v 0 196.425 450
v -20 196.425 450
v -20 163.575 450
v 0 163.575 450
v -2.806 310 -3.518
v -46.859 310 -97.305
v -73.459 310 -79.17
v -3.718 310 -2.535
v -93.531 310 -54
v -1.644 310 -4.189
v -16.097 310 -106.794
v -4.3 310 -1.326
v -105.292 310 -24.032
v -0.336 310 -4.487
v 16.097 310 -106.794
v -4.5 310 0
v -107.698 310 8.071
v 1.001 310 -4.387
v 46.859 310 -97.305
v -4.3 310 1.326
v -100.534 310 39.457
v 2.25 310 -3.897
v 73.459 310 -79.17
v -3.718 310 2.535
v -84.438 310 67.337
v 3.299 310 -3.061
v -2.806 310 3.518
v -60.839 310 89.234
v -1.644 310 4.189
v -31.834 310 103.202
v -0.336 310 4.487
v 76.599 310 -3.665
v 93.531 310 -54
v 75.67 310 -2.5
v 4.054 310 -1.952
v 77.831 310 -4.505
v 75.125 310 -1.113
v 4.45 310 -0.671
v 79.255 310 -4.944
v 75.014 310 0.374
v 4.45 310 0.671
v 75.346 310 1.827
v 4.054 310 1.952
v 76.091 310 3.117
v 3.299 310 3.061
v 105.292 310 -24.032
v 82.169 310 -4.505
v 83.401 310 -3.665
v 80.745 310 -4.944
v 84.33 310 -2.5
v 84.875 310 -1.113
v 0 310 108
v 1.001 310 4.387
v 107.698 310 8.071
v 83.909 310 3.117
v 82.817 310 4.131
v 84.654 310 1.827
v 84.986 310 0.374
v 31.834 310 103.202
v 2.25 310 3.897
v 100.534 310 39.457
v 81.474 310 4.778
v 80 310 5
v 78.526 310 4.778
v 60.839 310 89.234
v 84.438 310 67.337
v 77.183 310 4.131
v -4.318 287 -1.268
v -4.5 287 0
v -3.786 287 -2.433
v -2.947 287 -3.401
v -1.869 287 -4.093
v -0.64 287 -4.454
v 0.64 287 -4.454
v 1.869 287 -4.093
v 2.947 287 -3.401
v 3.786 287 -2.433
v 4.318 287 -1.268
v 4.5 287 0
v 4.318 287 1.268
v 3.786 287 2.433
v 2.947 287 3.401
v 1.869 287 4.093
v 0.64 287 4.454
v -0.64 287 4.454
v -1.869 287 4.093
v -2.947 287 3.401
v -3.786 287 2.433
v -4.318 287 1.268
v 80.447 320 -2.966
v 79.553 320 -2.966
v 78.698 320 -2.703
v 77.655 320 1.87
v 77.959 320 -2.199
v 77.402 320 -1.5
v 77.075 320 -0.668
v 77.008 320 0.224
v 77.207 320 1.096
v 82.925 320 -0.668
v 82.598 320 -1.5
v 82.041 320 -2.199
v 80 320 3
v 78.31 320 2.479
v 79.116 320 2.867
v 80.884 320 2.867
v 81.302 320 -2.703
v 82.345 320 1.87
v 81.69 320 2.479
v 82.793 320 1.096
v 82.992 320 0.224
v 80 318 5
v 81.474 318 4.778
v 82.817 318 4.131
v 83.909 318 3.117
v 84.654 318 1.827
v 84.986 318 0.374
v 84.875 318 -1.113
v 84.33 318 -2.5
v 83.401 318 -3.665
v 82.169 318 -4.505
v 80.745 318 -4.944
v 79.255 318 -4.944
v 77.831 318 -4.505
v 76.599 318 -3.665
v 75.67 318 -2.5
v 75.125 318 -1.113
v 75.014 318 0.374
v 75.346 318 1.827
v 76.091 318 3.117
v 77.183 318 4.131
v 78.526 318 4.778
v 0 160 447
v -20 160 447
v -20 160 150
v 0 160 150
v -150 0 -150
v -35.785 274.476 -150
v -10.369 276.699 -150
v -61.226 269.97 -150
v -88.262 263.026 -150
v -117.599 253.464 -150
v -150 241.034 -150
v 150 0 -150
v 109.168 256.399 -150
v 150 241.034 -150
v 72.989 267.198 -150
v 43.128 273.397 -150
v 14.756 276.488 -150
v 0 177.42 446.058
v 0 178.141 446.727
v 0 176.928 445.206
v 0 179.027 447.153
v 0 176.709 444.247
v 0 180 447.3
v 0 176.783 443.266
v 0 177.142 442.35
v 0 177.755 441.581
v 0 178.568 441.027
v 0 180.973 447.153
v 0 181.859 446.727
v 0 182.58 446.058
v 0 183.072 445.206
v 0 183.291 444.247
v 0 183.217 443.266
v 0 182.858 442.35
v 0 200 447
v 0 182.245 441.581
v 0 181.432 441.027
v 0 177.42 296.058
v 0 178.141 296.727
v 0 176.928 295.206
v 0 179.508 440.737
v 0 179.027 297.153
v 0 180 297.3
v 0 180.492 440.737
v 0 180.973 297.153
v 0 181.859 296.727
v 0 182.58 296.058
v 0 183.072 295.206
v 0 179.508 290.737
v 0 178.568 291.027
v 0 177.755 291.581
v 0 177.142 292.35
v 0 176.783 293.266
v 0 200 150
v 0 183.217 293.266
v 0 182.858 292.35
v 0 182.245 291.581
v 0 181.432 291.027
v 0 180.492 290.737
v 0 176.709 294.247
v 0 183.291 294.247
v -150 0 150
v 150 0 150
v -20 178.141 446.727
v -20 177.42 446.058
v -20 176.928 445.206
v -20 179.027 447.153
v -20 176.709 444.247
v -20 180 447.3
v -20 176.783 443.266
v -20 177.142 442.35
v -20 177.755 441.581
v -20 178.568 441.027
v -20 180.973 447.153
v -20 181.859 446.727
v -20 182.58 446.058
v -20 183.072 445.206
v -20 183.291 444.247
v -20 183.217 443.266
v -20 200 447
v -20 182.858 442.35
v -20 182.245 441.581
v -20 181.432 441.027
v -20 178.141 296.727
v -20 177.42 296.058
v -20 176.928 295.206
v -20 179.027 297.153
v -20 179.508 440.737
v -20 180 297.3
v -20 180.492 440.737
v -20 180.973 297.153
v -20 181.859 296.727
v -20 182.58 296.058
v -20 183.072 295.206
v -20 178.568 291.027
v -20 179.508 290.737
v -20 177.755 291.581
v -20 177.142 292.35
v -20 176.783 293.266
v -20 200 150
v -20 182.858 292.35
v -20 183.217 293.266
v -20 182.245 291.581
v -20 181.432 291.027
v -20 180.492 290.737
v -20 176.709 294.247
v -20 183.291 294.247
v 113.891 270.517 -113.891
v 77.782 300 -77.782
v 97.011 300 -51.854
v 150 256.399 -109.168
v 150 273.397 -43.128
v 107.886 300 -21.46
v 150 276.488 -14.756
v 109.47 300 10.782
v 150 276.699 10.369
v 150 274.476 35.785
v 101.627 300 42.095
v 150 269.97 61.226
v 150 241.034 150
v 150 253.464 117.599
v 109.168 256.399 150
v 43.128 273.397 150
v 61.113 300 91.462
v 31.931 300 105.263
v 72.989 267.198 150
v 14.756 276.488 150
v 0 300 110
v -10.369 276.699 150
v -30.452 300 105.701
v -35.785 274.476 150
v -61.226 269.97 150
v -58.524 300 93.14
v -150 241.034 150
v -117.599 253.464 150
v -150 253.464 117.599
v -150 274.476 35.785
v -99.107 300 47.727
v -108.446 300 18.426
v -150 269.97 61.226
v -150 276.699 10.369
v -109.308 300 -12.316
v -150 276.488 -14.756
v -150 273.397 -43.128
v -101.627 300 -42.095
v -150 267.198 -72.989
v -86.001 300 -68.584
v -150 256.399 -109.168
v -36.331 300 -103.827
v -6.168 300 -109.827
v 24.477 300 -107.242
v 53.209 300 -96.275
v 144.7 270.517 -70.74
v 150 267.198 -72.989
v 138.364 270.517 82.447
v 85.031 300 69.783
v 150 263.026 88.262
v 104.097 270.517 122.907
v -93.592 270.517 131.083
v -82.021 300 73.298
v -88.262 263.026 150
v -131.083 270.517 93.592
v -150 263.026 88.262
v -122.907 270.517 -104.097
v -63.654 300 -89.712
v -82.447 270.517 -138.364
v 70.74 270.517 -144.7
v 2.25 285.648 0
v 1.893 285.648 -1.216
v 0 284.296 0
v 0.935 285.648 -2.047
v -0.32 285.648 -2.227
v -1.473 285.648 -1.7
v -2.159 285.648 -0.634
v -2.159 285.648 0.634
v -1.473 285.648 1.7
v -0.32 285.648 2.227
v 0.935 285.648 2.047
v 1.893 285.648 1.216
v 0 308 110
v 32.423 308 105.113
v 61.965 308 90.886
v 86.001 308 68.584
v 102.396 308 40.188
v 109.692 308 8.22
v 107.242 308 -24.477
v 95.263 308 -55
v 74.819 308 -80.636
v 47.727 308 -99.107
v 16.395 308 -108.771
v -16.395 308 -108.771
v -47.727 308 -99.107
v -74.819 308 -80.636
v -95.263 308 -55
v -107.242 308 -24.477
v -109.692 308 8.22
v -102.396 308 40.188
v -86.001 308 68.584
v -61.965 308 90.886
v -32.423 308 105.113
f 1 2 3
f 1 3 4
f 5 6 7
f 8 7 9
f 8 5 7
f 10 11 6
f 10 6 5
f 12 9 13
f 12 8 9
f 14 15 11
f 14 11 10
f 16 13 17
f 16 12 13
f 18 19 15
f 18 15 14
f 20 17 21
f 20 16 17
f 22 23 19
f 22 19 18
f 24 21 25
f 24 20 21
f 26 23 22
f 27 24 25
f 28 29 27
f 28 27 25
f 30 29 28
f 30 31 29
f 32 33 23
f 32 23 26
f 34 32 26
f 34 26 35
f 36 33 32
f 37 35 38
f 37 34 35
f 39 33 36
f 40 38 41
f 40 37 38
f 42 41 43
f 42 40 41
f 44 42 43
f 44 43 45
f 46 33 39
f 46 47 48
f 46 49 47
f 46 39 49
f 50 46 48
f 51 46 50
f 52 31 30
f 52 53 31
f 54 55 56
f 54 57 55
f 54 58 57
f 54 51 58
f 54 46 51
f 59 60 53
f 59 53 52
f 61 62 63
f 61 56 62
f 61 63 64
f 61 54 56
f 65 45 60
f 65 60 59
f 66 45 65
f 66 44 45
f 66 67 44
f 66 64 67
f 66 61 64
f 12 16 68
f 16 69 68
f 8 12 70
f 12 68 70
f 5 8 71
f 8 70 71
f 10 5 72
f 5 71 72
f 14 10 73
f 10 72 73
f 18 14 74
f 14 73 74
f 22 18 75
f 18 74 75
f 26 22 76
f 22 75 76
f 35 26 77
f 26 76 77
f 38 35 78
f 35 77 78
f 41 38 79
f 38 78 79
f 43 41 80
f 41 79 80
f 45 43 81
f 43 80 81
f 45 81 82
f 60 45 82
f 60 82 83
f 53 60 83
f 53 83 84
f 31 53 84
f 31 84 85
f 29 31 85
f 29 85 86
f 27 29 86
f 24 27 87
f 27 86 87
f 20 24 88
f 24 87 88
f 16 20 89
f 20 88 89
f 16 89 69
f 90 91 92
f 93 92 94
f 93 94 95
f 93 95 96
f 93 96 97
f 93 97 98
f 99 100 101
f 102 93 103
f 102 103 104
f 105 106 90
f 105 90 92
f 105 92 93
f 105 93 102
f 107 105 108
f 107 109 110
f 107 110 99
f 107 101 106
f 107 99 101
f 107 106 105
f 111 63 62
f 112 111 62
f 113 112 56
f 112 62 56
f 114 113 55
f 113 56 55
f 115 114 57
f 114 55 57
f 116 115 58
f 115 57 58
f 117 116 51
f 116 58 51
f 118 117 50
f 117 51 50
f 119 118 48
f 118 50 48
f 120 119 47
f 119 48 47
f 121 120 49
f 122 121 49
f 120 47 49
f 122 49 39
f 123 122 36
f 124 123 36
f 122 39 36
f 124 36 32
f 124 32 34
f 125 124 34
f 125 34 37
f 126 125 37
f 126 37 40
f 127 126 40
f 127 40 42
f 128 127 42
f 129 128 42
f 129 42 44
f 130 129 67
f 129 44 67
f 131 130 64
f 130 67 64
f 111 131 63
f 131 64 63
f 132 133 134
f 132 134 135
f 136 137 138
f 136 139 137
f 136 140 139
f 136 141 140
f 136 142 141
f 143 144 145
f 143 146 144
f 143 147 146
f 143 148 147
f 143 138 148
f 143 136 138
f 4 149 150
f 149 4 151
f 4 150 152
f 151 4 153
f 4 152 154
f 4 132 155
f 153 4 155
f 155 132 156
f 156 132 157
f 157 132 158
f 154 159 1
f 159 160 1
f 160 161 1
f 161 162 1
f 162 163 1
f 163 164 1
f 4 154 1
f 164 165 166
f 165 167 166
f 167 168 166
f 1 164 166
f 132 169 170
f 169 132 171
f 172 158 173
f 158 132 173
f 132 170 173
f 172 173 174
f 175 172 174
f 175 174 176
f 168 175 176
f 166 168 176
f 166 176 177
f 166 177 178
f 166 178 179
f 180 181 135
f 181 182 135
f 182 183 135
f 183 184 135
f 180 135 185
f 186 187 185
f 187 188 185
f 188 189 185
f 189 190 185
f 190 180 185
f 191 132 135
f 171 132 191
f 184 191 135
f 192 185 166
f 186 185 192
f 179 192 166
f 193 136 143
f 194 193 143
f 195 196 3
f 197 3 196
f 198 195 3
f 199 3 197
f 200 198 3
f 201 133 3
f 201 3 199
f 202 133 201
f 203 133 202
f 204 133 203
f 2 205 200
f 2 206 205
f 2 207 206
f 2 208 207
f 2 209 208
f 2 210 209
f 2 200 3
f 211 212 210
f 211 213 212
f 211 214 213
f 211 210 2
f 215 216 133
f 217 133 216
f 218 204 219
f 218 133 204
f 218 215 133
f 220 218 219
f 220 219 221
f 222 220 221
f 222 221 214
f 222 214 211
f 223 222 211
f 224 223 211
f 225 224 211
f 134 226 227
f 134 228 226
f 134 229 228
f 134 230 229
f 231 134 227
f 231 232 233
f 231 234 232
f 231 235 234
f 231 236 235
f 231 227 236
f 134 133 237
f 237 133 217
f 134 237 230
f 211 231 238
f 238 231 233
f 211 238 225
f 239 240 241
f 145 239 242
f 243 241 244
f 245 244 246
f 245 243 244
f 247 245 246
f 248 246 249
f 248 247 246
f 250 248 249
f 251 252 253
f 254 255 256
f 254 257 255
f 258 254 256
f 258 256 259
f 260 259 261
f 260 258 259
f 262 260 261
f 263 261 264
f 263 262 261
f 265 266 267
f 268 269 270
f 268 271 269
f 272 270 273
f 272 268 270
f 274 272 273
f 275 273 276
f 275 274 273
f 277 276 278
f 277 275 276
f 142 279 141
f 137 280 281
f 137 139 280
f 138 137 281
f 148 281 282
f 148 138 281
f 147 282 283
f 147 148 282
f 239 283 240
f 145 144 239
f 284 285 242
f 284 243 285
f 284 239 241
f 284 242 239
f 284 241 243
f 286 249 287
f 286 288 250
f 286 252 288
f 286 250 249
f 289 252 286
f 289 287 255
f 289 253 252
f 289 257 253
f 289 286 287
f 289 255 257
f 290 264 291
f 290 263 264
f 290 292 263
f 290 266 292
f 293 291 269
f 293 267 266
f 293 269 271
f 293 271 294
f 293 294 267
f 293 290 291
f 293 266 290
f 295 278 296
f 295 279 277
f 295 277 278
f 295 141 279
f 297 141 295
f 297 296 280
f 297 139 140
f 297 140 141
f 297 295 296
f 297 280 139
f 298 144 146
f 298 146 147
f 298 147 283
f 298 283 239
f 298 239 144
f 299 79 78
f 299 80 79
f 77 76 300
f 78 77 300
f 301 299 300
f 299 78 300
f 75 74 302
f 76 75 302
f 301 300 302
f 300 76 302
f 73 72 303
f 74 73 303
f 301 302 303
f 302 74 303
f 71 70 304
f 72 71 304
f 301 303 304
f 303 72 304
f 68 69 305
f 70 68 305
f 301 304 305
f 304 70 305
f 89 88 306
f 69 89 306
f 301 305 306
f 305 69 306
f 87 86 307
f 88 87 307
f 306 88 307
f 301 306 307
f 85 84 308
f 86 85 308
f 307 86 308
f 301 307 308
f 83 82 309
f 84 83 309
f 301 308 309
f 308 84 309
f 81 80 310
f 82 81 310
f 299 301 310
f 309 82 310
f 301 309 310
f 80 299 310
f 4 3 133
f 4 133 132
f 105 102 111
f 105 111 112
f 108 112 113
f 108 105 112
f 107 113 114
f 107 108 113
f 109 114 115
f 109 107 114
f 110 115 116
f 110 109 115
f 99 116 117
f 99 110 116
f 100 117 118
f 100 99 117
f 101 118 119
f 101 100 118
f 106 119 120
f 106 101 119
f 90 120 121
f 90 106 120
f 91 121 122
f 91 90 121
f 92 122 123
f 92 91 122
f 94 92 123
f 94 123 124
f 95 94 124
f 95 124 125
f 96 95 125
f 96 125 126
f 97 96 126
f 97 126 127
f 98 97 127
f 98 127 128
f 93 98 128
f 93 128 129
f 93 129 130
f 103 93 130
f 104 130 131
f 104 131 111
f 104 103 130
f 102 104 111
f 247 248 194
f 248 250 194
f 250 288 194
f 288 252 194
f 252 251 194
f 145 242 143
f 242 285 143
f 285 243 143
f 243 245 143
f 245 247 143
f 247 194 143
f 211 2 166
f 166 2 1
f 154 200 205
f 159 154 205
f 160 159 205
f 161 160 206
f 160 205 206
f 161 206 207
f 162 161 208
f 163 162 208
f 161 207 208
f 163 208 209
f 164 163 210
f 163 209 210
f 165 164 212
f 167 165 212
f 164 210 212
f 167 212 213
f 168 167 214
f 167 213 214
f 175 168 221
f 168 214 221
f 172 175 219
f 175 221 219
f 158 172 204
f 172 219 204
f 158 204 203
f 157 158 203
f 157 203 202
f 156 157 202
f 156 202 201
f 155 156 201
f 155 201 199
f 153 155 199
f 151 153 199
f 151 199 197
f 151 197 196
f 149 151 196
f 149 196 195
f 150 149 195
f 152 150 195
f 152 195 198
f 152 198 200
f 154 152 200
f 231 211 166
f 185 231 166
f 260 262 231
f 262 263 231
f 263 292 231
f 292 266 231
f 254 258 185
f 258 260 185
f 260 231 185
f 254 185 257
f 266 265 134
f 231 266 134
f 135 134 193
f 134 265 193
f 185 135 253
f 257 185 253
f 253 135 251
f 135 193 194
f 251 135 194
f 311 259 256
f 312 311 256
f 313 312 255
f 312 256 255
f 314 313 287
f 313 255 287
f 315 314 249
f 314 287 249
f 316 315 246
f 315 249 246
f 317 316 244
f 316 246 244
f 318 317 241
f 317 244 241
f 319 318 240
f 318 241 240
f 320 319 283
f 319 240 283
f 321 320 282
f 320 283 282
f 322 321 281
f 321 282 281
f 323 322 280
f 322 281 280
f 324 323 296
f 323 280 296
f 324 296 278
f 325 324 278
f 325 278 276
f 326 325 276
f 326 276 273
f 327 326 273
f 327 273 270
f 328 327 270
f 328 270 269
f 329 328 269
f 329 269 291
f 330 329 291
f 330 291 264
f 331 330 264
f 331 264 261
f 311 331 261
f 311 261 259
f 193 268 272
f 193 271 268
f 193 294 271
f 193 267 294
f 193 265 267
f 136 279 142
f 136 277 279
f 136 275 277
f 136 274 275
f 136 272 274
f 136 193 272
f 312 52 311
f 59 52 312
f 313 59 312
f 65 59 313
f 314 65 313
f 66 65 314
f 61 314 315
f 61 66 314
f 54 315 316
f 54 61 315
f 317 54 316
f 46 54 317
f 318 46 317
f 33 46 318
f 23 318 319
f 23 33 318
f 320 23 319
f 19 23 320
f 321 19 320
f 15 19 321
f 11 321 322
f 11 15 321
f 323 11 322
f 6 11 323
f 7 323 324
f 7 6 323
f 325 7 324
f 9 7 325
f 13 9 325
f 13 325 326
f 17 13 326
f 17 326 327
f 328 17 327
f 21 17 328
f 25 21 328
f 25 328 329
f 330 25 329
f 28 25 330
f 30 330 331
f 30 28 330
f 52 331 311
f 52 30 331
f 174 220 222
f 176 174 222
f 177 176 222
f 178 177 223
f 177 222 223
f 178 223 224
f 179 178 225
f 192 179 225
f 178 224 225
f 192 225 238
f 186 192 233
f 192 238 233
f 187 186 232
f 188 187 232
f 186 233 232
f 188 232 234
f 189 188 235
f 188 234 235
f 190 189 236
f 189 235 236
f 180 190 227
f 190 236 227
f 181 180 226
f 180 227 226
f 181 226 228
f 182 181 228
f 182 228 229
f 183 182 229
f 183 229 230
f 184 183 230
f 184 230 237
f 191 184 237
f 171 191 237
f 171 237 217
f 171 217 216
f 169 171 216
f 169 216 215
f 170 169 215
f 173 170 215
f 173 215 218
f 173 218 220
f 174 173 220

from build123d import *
from OCP.BRepFilletAPI import BRepFilletAPI_MakeChamfer

# Parameters (mm, degrees)
SKETCH1_W                  = 300
SKETCH1_H                  = 300
BOSS_EXTRUDE1_DEPTH        = 300
SKETCH3_R                  = 110
BOSS_EXTRUDE2_DEPTH        = 10
SKETCH4_R                  = 5
BOSS_EXTRUDE3_DEPTH        = 10
CHAMFER1_SIZE              = 2
CHAMFER2_SIZE              = 2
M10X1_0_TAPPED_HOLE1_D     = 9
M10X1_0_TAPPED_HOLE1_DEPTH = 23
M10X1_0_TAPPED_HOLE1_TIP   = 2.703872786
SKETCH7_W                  = 20
SKETCH7_H                  = 40
BOSS_EXTRUDE4_DEPTH        = 300
CHAMFER3_SIZE              = 3
CHAMFER3_SIZE2             = 3.575260778
M6_CLEARANCE_HOLE1_D       = 6.6


with BuildPart() as part:
    # Sketch1 → Boss-Extrude1 (new body)
    with BuildSketch(Plane(origin=(0, 0, 0), x_dir=(1, 0, 0), z_dir=(0, 1, 0))):
        Rectangle(SKETCH1_W, SKETCH1_H)
    extrude(amount=BOSS_EXTRUDE1_DEPTH)

    # Sketch2 → Cut-Revolve1 (revolve, cut)
    with BuildSketch(Plane.XY, mode=Mode.PRIVATE) as cut_revolve1_sk:
        Polygon((110, 300), (250, 219.170962313), (250, 300), align=None)
    revolve(cut_revolve1_sk.sketch.rotate(Axis((0, 394.192122867, 0), (0, -1, 0)), 314.999999708), axis=Axis((0, 394.192122867, 0), (0, -1, 0)), mode=Mode.SUBTRACT)

    # Sketch3 → Boss-Extrude2 (add)
    with BuildSketch(Plane(origin=(0, 300, 0), x_dir=(1, 0, 0), z_dir=(0, 1, 0))):
        with Locations(Location((0, 0, 0), (0, 0, 270))):
            Circle(SKETCH3_R)
    extrude(amount=BOSS_EXTRUDE2_DEPTH)

    # Sketch4 → Boss-Extrude3 (add)
    with BuildSketch(Plane(origin=(0, 310, 0), x_dir=(1, 0, 0), z_dir=(0, 1, 0))):
        with Locations(Location((80, 0, 0), (0, 0, 270))):
            Circle(SKETCH4_R)
    extrude(amount=BOSS_EXTRUDE3_DEPTH)

    # Chamfer1
    chamfer1_edges = [part.edges().sort_by_distance(p)[0] for p in [
        (0, 310, -110),
    ]]
    chamfer(chamfer1_edges, length=CHAMFER1_SIZE)

    # Chamfer2
    chamfer2_edges = [part.edges().sort_by_distance(p)[0] for p in [
        (80, 320, -5),
    ]]
    chamfer(chamfer2_edges, length=CHAMFER2_SIZE)

    # M10x1.0 Tapped Hole1
    with Locations(Plane(origin=(0, 310, 0), x_dir=(1, 0, 0), z_dir=(0, 1, 0))):
        with Locations((0, 0)):
            Hole(M10X1_0_TAPPED_HOLE1_D / 2, depth=M10X1_0_TAPPED_HOLE1_DEPTH)
            with Locations((0, 0, -(M10X1_0_TAPPED_HOLE1_DEPTH + M10X1_0_TAPPED_HOLE1_TIP / 2))):  # 118° drill point
                Cone(0, M10X1_0_TAPPED_HOLE1_D / 2, M10X1_0_TAPPED_HOLE1_TIP, mode=Mode.SUBTRACT)

    # Sketch7 → Boss-Extrude4 (add)
    with BuildSketch(Plane.XY.offset(150)):
        with Locations((-10, 180)):
            Rectangle(SKETCH7_W, SKETCH7_H)
    extrude(amount=BOSS_EXTRUDE4_DEPTH)

    # Chamfer3: one chamfer whose edges measure the first distance from different faces: ONE call of the kernel's chamfer builder (chamfer() names one face for all edges)
    chamfer3_edges_1 = [part.edges().sort_by_distance(p)[0] for p in [
        (-10, 200, 450),
    ]]
    chamfer3_side_1 = [part.faces().sort_by_distance(p)[0] for p in [
        (-10, 200, 300),
    ]]
    chamfer3_edges_2 = [part.edges().sort_by_distance(p)[0] for p in [
        (-10, 160, 450),
    ]]
    chamfer3_side_2 = [part.faces().sort_by_distance(p)[0] for p in [
        (-10, 160, 300),
    ]]
    chamfer3 = BRepFilletAPI_MakeChamfer(part.part.solid().wrapped)
    for e in chamfer3_edges_1:
        chamfer3.Add(CHAMFER3_SIZE, CHAMFER3_SIZE2, e.wrapped, chamfer3_side_1[0].wrapped)  # the first distance lies on this face
    for e in chamfer3_edges_2:
        chamfer3.Add(CHAMFER3_SIZE, CHAMFER3_SIZE2, e.wrapped, chamfer3_side_2[0].wrapped)  # the first distance lies on this face
    add(Compound.cast(chamfer3.Shape()), mode=Mode.REPLACE)

    # M6 Clearance Hole1 (through all)
    with Locations(Plane(origin=(0, 0, 0), x_dir=(0, 0, -1), z_dir=(1, 0, 0))):
        with Locations((-444, 180), (-294, 180)):
            Hole(M6_CLEARANCE_HOLE1_D / 2)


solid = part.part
